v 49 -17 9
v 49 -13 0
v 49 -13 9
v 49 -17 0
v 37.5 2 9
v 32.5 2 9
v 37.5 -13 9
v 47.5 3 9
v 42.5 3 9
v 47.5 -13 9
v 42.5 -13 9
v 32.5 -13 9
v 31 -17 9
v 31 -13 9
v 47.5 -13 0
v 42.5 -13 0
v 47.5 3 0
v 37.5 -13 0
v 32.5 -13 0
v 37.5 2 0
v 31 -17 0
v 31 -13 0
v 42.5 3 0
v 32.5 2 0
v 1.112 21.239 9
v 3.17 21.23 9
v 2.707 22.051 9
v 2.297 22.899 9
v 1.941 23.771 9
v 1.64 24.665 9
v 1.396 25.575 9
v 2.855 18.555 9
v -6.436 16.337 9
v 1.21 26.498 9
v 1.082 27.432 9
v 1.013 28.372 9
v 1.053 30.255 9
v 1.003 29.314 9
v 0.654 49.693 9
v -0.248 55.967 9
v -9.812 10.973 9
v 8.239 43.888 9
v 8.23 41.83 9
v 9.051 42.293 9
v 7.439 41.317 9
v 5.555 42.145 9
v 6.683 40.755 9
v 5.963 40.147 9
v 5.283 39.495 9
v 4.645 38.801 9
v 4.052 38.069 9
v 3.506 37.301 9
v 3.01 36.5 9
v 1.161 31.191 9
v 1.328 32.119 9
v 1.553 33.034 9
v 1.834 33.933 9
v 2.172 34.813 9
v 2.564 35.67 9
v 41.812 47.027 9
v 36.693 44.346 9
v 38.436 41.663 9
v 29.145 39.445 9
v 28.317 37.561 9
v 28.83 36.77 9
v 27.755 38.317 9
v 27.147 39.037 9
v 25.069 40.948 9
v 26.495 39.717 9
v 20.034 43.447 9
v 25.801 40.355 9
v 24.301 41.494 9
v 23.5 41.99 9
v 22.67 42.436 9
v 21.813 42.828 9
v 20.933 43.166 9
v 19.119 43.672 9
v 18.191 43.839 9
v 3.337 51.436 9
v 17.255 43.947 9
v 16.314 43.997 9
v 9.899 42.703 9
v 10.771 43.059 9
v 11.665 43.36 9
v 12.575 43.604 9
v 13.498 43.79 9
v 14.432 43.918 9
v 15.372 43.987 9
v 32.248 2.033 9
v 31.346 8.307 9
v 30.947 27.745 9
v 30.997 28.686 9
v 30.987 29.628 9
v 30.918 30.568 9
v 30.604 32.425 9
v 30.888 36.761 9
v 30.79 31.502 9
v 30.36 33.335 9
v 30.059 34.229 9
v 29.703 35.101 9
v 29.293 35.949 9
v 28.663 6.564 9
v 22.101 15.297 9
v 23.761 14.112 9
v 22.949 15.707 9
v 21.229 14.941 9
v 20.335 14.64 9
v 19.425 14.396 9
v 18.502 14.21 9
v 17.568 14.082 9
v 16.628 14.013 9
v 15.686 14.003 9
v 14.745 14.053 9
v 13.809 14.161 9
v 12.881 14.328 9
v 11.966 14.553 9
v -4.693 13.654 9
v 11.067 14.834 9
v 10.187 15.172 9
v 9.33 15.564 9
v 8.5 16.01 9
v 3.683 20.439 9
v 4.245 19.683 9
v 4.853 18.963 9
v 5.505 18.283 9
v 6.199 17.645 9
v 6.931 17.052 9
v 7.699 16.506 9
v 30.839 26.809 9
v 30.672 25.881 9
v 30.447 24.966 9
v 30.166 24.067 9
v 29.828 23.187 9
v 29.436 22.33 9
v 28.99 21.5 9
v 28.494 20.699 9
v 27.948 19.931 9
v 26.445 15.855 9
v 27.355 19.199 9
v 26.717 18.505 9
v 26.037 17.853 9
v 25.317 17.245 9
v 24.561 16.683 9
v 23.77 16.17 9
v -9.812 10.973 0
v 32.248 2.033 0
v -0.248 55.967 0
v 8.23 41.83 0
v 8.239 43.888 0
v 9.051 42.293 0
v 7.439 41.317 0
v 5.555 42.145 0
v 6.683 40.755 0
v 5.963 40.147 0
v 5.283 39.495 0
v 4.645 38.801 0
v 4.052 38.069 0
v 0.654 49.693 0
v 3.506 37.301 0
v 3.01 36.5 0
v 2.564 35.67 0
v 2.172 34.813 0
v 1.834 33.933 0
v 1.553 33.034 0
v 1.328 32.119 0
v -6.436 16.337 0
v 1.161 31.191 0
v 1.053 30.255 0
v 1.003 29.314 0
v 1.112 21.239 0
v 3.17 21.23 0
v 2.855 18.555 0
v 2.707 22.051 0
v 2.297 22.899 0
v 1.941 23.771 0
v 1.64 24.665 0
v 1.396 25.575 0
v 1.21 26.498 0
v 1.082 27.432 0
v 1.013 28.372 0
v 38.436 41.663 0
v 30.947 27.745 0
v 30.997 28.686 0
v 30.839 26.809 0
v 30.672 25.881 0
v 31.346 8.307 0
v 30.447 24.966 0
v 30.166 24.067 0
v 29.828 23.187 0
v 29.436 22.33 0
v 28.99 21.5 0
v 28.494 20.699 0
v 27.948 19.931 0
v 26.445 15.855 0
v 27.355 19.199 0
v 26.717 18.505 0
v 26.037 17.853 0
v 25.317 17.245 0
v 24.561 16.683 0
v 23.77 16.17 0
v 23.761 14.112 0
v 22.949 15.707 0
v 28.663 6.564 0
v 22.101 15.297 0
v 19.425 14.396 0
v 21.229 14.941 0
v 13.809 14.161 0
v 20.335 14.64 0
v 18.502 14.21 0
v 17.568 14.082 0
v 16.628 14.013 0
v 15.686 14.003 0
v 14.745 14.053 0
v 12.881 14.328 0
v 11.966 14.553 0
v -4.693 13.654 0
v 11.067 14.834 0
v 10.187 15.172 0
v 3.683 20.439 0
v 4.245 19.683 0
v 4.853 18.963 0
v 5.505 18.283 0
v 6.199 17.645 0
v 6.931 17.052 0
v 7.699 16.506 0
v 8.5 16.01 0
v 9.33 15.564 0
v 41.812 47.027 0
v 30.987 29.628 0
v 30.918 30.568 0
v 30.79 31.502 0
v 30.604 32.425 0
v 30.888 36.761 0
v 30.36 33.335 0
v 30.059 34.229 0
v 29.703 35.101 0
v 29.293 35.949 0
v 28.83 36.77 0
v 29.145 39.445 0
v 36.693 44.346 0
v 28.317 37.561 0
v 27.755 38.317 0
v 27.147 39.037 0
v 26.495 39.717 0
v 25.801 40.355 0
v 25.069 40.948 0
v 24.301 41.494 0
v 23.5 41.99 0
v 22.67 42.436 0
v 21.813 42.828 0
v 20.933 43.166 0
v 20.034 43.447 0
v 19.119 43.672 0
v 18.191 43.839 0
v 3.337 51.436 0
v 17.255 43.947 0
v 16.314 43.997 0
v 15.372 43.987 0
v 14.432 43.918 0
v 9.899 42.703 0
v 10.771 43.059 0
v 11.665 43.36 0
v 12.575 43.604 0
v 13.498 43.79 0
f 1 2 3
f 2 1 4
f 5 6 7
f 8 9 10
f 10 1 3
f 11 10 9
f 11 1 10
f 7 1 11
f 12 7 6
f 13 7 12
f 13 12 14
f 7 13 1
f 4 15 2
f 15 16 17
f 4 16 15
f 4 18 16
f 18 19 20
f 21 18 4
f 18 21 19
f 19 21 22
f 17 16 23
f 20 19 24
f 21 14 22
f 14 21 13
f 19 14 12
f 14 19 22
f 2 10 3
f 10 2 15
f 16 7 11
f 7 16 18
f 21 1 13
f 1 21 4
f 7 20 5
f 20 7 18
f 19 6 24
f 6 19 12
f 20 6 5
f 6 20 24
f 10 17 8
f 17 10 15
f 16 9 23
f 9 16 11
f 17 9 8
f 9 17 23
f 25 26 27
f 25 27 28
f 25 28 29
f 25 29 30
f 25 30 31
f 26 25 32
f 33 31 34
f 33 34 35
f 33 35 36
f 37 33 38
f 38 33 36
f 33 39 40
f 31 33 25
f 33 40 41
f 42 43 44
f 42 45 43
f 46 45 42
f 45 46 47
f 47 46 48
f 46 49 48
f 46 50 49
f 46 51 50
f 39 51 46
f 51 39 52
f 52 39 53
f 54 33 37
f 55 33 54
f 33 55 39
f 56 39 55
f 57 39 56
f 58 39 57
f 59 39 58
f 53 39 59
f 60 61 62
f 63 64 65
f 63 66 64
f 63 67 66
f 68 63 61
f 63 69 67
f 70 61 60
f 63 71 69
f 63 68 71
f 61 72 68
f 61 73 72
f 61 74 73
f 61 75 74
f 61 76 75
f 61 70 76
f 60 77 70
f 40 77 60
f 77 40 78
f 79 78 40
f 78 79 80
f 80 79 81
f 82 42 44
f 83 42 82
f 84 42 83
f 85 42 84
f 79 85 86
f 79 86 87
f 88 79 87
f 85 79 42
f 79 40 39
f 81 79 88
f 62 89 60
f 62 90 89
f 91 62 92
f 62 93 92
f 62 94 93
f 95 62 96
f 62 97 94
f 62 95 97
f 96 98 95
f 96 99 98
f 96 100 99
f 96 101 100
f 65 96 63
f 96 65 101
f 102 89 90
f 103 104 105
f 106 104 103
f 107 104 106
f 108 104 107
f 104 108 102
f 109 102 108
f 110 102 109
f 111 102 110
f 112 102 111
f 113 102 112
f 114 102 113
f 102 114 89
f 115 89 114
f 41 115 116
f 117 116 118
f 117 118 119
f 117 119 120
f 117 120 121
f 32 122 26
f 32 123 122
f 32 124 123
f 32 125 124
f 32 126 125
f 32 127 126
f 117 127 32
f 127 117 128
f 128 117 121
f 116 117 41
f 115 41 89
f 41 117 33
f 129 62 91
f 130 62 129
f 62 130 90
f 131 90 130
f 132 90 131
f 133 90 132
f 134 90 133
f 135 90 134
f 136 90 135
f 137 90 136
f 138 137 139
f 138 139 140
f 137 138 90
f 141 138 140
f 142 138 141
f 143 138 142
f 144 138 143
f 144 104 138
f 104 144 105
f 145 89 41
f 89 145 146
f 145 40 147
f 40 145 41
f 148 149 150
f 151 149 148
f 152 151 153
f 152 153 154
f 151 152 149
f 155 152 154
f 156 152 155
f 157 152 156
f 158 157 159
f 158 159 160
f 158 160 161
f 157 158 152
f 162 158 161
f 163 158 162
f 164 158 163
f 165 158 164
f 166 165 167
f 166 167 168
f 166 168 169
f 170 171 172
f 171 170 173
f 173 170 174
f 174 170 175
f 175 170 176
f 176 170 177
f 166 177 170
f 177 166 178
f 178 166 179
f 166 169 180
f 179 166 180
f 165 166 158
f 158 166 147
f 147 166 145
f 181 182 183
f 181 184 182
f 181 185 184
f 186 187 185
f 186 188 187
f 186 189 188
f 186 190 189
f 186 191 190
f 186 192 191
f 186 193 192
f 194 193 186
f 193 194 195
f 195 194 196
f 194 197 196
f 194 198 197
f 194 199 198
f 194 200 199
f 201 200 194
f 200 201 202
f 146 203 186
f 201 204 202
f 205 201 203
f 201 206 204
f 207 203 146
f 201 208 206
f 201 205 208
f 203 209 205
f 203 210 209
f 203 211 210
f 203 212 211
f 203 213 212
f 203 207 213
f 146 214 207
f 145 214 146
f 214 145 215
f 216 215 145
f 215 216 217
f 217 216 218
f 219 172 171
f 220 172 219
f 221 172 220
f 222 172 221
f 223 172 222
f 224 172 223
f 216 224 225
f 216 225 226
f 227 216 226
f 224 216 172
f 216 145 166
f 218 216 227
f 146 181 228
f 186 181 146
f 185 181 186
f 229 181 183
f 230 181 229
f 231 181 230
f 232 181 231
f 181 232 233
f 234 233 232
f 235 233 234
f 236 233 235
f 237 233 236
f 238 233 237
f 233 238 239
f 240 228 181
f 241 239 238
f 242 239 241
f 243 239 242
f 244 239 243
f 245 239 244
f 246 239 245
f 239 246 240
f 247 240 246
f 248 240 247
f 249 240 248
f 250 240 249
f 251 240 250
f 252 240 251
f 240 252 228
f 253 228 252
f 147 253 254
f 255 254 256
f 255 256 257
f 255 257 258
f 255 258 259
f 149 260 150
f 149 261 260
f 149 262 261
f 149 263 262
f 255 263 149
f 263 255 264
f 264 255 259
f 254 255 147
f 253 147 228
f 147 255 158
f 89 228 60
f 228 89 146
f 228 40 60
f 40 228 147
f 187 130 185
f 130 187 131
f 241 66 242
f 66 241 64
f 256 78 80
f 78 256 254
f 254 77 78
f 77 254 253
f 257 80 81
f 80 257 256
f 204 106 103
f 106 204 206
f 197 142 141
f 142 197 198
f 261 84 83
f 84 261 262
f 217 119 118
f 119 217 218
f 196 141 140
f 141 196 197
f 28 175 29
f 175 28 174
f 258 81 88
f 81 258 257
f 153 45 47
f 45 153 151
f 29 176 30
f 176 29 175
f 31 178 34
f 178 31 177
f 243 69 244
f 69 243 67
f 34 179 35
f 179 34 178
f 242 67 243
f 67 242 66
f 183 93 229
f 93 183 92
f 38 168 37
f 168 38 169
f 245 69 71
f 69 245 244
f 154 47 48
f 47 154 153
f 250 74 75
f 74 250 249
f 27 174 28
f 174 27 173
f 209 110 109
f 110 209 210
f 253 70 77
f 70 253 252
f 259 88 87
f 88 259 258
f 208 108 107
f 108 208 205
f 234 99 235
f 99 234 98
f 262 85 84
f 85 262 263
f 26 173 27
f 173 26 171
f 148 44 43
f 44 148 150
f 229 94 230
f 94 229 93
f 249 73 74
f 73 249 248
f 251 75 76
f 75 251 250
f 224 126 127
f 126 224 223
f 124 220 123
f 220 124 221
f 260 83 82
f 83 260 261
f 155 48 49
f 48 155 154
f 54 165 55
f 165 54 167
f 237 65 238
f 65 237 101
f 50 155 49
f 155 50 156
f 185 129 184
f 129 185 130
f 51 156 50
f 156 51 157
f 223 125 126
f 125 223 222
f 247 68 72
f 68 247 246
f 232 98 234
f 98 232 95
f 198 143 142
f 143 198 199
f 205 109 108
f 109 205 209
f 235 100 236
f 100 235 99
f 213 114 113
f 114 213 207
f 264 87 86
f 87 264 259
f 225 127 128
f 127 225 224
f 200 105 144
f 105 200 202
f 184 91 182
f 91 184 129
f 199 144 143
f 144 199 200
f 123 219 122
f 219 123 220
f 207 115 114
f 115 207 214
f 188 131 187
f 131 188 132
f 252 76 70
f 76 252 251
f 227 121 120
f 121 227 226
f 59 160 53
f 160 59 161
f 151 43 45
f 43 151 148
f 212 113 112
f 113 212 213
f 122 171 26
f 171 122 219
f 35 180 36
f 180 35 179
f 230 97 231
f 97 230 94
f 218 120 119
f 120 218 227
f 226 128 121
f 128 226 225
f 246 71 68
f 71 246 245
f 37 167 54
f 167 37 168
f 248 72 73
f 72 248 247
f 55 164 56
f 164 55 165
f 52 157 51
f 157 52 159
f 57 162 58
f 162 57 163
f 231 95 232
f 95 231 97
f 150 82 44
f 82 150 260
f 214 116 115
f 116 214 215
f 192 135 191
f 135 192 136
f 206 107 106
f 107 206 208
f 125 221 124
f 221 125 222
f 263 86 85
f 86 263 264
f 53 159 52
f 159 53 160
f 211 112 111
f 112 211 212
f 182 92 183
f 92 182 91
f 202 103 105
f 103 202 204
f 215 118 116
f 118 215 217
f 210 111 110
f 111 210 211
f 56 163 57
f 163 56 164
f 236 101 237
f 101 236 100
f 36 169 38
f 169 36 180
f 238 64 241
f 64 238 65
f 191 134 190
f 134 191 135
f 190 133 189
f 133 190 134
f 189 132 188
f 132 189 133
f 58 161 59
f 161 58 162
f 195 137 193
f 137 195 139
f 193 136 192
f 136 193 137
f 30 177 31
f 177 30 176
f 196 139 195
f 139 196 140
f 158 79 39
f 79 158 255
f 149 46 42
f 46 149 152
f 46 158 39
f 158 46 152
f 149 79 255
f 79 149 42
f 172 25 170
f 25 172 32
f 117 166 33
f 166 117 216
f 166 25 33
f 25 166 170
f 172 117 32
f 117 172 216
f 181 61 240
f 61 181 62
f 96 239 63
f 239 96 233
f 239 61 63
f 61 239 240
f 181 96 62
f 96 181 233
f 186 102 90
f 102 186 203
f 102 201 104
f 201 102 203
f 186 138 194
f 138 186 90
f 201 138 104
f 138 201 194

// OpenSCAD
// file: configuration.scad
// PRUSA Mendel
// Configuration file
// GNU GPL v2
// Josef Pruša
// josefprusa@me.com
// prusadjs.cz
// http://www.reprap.org/wiki/Prusa_Mendel
// http://github.com/prusajr/PrusaMendel
// M8 rod diameter
m8_diameter = 9;
// M8 nut diameter diameter
// Used for $fn nut trick -> cylinder(h = 5, r=4.5, $fn=6, center=true);
m8_nut_diameter = 16;
// M4 rod/screw diameter
m4_diameter = 5.5;
// M4 nut diameter diameter
// Used for $fn nut trick -> cylinder(h = 5, r=4.5, $fn=6, center=true);
m4_nut_diameter = 10;
// M3 rod/screw diameter
m3_diameter = 5.5;
// M3 nut diameter diameter
// Used for $fn nut trick -> cylinder(h = 5, r=4.5, $fn=6, center=true);
m3_nut_diameter = 10;
// Bushing holders diameter
bushing_diameter = 11.5;
//Does your Machine Have Support Material?
has_support = false;
// main file
// PRUSA Mendel
// Frame vertex
// GNU GPL v2
// Josef Průša
// josefprusa@me.com
// prusadjs.cz
// http://www.reprap.org/wiki/Prusa_Mendel
// http://github.com/prusajr/PrusaMendel

// Based on http://www.thingiverse.com/thing:2003 aka Viks footed 
// frame vertex, which is based on http://www.thingiverse.com/thing:1780 
// aka Tonokps parametric frame vertex
// Thank you guys for your great work
include <configuration.scad>

vfM8=m8_diameter+0.9;
vfvertex_height=m8_diameter;

vfFN=100;

module vertex_foot() {
	union () {
		cube([18,4,vfvertex_height],center=true);
		translate ([-5,8,0]) cube([5,18,vfvertex_height],center=true);
		translate ([5,9,0]) cube([5,18,vfvertex_height],center=true);
	}
}

module vertex(){

	translate ([0,0,vfvertex_height/2])difference() 
	{
		union () {
			dxf_linear_extrude(file = "vertex-body-fixed-qcad.dxf",height=vfvertex_height,center=true);
			translate([40,-15,0]) vertex_foot();
		}

		translate([11.013,59.912]) zhole(vfM8); 
		translate([40.274,9.249,0]) zhole(vfM8); 
	}
}

module zhole(diameter) cylinder(h=100,r=(diameter/2),center=true,$fn=vfFN); 

module motor_mount()
{
	union () {
		difference (){
			union() {
				vertex();
				translate ([16,29,vfvertex_height/2]) rotate(a=[0,0,78]) cube(size = [46,43,vfvertex_height], center = true); 
			}

			translate ([16,29,vfvertex_height/2]) rotate(a=[0,0,78]) union () {
				translate ([0,0,-20]) cylinder(h = 100, r=15, $fn=100); 
				translate(v=[15,15,0]) rotate(a=[0,0,45]) cube(size = [9,3.2,25], center = true); 
				translate(v=[-15,15,0]) rotate(a=[0,0,-45]) cube(size = [9,3.2,25], center = true);
				translate(v=[15,-15,0]) rotate(a=[0,0,-45]) cube(size = [9,3.2,25], center = true);
				translate(v=[-15,-15,0]) rotate(a=[0,0,45]) cube(size = [9,3.2,25], center = true);
			}
		}
	}
}

motor_mount();
